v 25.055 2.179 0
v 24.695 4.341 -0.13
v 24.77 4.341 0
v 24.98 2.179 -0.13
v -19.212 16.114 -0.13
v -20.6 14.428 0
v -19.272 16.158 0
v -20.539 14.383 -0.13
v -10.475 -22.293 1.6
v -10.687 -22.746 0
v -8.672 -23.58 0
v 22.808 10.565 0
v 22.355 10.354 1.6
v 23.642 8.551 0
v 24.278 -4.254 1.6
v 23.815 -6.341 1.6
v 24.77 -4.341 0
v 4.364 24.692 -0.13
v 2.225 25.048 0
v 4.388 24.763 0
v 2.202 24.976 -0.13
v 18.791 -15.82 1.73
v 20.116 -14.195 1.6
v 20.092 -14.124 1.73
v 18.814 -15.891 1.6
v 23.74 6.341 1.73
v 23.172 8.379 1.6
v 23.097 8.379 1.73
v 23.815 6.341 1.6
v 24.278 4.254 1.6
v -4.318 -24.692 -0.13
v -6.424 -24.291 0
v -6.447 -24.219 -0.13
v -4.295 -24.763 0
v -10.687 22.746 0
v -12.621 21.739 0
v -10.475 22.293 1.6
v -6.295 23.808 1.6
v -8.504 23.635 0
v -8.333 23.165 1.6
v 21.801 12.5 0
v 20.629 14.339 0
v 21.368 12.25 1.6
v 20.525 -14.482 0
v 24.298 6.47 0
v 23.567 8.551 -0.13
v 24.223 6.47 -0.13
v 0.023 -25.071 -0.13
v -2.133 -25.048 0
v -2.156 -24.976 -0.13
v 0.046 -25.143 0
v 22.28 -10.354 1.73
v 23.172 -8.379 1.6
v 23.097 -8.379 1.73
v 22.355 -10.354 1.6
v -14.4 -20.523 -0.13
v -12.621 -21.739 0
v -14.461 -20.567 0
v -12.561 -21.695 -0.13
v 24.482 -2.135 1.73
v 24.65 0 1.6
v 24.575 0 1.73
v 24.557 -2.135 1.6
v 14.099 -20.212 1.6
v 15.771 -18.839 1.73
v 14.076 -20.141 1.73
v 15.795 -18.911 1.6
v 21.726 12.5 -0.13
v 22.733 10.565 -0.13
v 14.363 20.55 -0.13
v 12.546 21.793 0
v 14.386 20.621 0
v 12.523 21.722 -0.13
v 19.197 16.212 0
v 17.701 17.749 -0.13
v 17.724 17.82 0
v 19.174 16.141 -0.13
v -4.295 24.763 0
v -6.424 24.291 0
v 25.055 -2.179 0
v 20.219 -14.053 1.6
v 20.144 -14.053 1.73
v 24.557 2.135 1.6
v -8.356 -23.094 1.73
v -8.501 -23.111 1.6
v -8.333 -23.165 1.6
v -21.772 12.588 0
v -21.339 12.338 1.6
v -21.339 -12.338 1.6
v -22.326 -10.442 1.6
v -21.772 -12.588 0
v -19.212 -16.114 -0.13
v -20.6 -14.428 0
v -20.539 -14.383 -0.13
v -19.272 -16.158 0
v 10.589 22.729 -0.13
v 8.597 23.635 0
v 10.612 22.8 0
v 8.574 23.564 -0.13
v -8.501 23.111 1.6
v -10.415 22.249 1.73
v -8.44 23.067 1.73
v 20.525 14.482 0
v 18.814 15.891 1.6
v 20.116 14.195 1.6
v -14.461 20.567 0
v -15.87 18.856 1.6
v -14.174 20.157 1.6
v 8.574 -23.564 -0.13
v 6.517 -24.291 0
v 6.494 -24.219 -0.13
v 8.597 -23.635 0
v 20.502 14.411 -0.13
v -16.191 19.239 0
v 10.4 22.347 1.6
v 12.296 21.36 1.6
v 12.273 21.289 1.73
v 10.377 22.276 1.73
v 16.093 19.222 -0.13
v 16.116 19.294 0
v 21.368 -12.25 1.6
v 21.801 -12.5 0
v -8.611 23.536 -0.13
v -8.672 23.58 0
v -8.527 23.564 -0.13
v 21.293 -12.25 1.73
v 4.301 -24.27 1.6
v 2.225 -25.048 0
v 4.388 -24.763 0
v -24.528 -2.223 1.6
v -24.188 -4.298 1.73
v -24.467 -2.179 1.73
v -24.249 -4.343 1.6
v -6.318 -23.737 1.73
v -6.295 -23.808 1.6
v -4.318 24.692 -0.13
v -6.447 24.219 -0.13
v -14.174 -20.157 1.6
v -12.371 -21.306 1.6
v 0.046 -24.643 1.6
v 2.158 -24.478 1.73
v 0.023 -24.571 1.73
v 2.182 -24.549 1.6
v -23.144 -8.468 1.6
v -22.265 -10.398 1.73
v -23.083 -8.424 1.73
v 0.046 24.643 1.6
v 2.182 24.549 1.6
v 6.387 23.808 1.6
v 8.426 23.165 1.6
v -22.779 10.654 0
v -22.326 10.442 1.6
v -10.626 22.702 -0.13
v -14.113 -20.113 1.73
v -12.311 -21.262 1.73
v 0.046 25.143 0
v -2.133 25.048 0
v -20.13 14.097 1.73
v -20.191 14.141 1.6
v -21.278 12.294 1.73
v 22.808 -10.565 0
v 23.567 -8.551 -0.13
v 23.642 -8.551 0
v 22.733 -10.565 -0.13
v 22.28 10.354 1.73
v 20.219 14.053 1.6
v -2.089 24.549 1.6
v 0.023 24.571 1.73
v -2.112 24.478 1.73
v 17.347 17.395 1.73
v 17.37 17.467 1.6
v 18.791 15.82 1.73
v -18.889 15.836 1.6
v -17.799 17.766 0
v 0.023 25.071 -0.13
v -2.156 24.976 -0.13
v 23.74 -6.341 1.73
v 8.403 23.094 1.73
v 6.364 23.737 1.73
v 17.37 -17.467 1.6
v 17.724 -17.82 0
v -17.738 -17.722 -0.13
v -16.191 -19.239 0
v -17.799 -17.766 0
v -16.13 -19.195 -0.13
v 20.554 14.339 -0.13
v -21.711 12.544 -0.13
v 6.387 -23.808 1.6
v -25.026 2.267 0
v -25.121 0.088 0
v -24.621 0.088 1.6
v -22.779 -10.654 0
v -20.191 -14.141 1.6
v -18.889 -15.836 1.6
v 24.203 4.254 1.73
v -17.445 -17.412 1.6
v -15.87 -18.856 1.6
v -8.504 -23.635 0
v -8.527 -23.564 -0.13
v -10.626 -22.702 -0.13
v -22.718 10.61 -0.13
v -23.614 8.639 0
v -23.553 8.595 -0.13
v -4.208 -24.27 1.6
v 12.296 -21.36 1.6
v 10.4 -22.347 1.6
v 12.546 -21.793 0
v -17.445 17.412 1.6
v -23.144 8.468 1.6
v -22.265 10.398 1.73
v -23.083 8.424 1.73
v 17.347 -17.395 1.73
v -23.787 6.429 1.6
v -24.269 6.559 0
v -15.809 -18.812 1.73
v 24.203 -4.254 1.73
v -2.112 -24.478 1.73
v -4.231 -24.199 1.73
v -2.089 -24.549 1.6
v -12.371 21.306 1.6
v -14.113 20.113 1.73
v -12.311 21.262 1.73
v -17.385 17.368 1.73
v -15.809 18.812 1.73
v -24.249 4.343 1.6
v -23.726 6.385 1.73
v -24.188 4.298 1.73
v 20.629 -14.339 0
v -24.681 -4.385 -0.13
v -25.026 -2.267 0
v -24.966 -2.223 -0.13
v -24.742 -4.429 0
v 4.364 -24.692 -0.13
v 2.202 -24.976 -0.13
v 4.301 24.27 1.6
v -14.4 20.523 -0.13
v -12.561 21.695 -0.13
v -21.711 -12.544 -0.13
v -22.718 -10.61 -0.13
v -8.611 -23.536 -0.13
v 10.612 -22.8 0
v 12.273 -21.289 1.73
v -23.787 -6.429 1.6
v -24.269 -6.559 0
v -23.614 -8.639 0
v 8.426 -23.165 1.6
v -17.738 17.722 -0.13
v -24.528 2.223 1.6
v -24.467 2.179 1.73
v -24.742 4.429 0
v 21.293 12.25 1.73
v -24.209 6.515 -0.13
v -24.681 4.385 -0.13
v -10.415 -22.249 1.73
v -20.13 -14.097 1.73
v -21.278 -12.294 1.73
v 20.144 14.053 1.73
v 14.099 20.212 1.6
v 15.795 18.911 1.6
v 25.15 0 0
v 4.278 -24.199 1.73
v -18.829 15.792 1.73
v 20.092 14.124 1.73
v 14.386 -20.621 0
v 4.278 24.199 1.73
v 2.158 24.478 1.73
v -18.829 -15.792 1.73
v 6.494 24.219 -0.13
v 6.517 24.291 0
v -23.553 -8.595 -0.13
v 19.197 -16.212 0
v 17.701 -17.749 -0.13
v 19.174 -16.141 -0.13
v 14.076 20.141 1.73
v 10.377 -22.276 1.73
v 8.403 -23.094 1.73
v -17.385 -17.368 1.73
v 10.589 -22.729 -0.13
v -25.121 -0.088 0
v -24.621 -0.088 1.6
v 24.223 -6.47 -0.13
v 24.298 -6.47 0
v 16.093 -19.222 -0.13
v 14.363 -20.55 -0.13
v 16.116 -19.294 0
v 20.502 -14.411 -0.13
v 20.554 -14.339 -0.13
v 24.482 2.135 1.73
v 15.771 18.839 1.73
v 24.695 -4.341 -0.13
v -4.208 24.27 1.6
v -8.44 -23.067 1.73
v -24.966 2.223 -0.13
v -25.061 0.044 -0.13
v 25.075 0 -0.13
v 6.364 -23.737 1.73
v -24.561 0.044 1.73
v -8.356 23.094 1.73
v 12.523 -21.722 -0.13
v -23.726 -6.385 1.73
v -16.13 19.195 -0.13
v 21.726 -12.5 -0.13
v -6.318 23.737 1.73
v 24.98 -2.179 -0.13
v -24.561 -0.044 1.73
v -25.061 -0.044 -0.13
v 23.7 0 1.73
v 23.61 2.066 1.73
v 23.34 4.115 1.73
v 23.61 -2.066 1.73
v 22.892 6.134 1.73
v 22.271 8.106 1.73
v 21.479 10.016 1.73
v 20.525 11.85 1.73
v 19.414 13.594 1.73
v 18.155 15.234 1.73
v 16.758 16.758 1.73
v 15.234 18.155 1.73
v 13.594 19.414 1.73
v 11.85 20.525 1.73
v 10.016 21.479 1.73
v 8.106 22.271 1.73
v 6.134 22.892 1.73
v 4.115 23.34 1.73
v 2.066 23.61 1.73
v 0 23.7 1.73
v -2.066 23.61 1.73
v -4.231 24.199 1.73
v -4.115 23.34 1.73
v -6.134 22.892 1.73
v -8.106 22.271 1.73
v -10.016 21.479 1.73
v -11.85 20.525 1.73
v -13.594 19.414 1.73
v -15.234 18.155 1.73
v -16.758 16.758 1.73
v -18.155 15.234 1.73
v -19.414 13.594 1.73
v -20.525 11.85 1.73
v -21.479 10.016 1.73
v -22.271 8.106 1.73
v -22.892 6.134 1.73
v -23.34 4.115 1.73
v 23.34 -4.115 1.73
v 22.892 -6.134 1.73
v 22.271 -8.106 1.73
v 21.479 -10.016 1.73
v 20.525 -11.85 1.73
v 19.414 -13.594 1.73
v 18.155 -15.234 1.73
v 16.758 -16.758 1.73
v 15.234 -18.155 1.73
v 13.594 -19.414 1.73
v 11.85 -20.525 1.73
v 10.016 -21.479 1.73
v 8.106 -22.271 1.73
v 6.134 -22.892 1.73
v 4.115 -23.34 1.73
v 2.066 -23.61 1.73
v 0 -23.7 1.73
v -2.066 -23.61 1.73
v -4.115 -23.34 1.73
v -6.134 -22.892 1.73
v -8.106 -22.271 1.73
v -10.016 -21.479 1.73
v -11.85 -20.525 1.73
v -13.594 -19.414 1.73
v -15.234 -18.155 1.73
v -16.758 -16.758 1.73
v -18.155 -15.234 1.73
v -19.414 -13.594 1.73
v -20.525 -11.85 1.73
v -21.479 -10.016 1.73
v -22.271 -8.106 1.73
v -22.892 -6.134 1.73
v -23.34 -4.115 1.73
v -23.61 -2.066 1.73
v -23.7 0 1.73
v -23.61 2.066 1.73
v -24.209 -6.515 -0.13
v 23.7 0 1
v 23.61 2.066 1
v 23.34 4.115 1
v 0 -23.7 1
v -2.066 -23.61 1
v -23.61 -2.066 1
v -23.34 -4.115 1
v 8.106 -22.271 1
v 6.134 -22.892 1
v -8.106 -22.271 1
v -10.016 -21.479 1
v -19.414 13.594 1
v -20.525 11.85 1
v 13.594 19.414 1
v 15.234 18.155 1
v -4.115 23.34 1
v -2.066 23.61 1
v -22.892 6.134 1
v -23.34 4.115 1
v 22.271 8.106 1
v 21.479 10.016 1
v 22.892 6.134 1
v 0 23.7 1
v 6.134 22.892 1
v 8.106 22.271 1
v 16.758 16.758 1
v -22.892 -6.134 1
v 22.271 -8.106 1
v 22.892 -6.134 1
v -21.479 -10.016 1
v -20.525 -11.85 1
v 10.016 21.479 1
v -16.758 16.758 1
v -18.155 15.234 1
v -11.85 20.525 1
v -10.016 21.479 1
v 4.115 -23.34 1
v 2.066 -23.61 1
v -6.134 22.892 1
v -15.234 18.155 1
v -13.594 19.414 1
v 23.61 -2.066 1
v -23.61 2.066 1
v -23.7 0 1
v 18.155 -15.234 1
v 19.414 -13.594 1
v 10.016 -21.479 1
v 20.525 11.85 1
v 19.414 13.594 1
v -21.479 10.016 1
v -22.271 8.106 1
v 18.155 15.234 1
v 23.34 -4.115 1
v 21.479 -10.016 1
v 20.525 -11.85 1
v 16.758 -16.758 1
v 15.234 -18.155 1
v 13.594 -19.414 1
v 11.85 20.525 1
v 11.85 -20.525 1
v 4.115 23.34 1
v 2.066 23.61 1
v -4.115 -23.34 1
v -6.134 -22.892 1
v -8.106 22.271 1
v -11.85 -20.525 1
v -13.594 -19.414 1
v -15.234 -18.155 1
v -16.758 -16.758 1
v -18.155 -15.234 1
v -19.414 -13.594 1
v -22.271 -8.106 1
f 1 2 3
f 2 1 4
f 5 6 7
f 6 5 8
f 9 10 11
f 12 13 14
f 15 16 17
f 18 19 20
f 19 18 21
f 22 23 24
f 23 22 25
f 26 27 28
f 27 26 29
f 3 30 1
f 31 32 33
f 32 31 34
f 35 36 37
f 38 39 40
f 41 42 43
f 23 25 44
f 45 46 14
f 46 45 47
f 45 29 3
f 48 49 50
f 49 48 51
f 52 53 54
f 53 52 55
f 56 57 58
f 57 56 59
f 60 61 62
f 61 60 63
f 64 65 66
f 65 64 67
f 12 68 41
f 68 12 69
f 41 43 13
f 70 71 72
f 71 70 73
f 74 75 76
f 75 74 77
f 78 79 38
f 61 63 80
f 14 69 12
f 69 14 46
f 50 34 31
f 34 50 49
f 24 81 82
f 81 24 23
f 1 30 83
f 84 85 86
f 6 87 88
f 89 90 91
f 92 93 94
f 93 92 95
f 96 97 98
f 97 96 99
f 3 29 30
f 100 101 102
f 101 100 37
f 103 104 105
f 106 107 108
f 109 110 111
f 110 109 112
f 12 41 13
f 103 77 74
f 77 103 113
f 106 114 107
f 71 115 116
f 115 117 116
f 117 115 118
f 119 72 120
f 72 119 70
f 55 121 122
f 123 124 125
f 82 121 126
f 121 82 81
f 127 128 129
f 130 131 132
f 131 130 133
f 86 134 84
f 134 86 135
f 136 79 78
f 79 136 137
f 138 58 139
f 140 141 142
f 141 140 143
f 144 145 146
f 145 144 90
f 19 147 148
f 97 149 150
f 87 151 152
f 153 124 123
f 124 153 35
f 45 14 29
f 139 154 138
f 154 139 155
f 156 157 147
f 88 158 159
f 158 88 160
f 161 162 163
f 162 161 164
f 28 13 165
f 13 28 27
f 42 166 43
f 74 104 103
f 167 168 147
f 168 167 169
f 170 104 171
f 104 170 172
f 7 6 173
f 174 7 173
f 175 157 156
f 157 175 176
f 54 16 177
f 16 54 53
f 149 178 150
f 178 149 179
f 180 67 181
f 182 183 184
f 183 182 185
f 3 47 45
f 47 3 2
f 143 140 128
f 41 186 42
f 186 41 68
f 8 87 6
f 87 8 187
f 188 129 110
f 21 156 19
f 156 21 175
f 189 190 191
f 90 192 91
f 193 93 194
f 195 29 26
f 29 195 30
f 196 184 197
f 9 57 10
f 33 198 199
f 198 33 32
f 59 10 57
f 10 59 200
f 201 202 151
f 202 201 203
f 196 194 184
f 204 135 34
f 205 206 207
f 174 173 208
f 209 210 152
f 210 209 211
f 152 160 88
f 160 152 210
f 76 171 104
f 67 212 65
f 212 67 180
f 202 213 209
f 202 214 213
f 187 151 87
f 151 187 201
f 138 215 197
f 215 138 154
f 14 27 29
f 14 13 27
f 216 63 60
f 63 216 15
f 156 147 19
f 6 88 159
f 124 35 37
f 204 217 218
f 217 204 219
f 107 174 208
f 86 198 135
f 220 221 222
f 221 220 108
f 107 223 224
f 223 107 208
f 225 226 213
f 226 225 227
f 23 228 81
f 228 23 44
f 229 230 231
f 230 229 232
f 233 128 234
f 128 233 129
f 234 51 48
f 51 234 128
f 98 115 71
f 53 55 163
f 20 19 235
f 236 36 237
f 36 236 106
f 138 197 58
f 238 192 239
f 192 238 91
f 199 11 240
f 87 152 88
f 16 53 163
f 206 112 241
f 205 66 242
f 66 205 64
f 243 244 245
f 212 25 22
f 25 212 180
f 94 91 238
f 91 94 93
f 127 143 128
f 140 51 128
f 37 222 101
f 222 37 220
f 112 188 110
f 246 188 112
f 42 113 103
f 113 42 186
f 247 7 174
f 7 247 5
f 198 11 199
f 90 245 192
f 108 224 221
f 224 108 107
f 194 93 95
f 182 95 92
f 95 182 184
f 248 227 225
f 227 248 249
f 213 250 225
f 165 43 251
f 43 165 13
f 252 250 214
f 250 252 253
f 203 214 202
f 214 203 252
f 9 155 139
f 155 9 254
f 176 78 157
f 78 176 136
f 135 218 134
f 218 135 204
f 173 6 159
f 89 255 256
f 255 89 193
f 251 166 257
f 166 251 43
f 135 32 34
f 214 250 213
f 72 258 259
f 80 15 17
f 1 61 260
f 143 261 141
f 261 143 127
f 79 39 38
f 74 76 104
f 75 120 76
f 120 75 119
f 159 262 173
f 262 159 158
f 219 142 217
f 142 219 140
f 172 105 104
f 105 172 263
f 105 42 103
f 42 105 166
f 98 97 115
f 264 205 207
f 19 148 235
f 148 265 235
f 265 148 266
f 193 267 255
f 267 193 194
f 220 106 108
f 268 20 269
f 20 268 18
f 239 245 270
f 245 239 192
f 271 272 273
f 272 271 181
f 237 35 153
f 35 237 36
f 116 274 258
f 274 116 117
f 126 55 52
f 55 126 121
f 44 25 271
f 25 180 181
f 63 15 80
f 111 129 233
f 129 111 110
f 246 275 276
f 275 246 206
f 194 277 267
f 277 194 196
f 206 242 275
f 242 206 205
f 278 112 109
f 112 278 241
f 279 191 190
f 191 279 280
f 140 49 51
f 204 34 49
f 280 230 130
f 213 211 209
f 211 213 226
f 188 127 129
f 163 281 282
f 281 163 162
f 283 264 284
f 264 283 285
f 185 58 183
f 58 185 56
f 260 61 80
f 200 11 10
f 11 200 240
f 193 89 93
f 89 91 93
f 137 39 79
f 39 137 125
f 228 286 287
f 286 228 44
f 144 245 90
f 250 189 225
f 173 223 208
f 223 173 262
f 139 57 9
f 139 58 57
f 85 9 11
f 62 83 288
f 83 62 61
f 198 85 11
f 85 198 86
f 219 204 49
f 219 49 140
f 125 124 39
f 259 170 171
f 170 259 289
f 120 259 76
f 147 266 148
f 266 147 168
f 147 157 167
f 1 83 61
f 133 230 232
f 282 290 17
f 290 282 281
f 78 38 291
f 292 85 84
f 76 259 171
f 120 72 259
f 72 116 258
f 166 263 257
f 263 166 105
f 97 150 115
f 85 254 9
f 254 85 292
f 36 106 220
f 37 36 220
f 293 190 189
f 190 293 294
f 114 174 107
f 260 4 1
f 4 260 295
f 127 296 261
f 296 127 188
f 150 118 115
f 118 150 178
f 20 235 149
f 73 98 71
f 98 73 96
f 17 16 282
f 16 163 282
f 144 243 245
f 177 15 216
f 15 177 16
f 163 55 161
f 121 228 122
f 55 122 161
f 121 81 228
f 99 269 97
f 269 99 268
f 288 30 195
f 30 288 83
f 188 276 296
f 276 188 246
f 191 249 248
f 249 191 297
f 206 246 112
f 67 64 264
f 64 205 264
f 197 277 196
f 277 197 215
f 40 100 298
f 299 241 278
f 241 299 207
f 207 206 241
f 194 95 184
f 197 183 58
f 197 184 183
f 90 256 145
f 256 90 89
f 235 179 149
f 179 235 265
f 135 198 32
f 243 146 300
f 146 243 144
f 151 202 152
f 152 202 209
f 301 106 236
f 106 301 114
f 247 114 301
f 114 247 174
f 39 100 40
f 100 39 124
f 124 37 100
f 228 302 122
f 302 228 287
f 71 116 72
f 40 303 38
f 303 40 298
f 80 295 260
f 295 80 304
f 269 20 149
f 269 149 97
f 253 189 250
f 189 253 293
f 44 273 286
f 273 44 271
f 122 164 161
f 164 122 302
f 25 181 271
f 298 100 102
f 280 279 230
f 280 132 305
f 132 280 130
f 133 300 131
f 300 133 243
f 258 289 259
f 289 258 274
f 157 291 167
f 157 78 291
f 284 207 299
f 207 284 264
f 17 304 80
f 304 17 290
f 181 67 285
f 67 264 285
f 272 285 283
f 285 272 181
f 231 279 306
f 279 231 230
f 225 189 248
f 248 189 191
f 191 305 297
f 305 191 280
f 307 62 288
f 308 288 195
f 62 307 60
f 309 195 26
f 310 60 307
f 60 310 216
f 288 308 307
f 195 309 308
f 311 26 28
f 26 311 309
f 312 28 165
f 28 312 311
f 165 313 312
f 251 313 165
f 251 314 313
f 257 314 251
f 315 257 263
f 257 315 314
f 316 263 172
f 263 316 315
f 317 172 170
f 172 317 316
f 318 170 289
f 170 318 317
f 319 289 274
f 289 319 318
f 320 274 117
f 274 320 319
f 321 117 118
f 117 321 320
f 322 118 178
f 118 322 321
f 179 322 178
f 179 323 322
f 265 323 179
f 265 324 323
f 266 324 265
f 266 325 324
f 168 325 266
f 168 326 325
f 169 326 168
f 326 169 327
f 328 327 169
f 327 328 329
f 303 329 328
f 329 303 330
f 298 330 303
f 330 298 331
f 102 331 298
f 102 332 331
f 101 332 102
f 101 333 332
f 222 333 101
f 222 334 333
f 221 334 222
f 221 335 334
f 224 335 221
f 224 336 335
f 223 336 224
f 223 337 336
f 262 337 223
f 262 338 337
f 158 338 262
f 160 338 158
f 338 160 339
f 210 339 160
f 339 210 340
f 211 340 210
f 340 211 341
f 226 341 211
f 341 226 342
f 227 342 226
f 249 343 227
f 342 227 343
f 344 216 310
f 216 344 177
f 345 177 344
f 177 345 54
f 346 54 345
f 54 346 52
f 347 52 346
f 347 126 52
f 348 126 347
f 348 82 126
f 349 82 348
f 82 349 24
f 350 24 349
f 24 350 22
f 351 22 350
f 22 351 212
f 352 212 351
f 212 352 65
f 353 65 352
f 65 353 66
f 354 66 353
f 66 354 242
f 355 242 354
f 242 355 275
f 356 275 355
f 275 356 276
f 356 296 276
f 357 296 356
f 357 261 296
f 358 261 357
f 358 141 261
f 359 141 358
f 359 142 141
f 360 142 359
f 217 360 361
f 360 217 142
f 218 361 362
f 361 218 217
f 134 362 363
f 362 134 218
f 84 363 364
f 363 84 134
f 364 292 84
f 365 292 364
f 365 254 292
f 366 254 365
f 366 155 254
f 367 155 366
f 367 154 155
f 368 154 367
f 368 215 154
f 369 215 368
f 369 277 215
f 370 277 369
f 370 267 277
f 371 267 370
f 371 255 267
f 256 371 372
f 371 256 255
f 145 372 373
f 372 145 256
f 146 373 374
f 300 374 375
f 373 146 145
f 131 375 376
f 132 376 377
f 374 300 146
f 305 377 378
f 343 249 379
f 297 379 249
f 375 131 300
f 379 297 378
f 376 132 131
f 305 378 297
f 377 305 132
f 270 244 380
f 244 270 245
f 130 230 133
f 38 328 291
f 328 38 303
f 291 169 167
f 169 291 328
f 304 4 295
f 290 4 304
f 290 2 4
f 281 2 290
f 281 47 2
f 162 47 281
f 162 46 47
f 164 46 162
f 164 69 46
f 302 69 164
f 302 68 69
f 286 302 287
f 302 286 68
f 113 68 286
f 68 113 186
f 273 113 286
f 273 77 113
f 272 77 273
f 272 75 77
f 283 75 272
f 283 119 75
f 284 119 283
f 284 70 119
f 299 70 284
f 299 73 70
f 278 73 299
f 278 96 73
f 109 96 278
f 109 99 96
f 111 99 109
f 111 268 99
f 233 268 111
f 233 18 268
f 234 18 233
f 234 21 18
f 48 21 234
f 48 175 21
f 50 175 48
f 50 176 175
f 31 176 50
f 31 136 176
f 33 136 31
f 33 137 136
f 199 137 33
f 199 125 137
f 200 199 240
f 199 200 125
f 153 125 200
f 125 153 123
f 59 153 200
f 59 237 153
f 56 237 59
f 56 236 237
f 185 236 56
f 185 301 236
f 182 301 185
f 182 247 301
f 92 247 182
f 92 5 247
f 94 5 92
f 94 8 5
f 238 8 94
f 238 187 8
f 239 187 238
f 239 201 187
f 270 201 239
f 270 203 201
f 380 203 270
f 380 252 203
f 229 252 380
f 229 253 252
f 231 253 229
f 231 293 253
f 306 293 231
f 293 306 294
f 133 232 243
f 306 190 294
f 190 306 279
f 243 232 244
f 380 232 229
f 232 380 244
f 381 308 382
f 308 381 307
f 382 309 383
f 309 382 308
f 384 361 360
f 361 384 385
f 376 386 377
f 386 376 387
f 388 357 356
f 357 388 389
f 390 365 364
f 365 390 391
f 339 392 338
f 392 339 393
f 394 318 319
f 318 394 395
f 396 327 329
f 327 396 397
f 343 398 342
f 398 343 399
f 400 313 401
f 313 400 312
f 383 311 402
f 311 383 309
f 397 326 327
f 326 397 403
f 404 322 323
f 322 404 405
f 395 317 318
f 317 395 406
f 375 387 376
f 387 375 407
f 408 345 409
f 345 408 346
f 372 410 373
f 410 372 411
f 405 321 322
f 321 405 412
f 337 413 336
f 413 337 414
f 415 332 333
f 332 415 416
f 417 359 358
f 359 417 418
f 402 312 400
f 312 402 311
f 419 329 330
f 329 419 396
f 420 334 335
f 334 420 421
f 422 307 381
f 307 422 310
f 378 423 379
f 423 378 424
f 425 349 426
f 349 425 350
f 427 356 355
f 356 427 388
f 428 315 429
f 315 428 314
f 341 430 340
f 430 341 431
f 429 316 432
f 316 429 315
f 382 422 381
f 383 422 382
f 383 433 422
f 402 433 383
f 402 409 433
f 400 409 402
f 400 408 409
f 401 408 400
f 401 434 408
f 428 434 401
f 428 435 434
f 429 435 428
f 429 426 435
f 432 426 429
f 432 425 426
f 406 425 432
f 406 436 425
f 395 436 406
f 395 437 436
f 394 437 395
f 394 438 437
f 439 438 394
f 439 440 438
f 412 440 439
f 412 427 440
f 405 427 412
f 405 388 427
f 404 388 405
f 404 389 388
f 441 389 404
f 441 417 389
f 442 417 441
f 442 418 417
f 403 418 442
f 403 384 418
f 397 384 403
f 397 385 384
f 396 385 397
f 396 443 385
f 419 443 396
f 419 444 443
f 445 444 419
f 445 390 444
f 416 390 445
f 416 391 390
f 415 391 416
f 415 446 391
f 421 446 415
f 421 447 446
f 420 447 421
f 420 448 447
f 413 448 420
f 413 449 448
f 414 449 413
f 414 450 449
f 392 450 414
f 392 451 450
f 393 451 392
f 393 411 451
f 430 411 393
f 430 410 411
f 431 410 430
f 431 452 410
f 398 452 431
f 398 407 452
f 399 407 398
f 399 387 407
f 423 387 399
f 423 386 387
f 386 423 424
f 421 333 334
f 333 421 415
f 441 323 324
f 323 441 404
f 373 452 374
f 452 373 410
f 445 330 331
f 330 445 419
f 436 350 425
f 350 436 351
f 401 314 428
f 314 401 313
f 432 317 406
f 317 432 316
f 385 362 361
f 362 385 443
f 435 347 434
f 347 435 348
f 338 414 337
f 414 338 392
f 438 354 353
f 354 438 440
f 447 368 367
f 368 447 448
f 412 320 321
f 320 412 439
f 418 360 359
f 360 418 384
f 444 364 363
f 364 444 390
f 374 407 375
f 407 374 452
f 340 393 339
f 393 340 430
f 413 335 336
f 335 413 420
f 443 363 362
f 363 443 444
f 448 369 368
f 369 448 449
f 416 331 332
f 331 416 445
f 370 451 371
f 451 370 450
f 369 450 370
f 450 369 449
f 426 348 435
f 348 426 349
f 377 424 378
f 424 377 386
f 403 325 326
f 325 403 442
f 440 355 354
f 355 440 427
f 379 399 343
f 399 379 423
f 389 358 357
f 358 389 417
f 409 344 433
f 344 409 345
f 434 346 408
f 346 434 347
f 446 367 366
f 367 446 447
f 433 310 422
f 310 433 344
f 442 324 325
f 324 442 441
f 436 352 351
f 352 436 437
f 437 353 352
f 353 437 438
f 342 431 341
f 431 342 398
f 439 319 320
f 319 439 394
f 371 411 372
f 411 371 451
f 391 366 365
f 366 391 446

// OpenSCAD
difference() {
    minkowski() {
        cylinder(h=1.6, d1 = 50, d2 = 49, $fn = 72);
        sphere(0.15);
    };

        translate([0, 0, 1]) cylinder(h=1, d = 47.4, $fn = 72);
    };
